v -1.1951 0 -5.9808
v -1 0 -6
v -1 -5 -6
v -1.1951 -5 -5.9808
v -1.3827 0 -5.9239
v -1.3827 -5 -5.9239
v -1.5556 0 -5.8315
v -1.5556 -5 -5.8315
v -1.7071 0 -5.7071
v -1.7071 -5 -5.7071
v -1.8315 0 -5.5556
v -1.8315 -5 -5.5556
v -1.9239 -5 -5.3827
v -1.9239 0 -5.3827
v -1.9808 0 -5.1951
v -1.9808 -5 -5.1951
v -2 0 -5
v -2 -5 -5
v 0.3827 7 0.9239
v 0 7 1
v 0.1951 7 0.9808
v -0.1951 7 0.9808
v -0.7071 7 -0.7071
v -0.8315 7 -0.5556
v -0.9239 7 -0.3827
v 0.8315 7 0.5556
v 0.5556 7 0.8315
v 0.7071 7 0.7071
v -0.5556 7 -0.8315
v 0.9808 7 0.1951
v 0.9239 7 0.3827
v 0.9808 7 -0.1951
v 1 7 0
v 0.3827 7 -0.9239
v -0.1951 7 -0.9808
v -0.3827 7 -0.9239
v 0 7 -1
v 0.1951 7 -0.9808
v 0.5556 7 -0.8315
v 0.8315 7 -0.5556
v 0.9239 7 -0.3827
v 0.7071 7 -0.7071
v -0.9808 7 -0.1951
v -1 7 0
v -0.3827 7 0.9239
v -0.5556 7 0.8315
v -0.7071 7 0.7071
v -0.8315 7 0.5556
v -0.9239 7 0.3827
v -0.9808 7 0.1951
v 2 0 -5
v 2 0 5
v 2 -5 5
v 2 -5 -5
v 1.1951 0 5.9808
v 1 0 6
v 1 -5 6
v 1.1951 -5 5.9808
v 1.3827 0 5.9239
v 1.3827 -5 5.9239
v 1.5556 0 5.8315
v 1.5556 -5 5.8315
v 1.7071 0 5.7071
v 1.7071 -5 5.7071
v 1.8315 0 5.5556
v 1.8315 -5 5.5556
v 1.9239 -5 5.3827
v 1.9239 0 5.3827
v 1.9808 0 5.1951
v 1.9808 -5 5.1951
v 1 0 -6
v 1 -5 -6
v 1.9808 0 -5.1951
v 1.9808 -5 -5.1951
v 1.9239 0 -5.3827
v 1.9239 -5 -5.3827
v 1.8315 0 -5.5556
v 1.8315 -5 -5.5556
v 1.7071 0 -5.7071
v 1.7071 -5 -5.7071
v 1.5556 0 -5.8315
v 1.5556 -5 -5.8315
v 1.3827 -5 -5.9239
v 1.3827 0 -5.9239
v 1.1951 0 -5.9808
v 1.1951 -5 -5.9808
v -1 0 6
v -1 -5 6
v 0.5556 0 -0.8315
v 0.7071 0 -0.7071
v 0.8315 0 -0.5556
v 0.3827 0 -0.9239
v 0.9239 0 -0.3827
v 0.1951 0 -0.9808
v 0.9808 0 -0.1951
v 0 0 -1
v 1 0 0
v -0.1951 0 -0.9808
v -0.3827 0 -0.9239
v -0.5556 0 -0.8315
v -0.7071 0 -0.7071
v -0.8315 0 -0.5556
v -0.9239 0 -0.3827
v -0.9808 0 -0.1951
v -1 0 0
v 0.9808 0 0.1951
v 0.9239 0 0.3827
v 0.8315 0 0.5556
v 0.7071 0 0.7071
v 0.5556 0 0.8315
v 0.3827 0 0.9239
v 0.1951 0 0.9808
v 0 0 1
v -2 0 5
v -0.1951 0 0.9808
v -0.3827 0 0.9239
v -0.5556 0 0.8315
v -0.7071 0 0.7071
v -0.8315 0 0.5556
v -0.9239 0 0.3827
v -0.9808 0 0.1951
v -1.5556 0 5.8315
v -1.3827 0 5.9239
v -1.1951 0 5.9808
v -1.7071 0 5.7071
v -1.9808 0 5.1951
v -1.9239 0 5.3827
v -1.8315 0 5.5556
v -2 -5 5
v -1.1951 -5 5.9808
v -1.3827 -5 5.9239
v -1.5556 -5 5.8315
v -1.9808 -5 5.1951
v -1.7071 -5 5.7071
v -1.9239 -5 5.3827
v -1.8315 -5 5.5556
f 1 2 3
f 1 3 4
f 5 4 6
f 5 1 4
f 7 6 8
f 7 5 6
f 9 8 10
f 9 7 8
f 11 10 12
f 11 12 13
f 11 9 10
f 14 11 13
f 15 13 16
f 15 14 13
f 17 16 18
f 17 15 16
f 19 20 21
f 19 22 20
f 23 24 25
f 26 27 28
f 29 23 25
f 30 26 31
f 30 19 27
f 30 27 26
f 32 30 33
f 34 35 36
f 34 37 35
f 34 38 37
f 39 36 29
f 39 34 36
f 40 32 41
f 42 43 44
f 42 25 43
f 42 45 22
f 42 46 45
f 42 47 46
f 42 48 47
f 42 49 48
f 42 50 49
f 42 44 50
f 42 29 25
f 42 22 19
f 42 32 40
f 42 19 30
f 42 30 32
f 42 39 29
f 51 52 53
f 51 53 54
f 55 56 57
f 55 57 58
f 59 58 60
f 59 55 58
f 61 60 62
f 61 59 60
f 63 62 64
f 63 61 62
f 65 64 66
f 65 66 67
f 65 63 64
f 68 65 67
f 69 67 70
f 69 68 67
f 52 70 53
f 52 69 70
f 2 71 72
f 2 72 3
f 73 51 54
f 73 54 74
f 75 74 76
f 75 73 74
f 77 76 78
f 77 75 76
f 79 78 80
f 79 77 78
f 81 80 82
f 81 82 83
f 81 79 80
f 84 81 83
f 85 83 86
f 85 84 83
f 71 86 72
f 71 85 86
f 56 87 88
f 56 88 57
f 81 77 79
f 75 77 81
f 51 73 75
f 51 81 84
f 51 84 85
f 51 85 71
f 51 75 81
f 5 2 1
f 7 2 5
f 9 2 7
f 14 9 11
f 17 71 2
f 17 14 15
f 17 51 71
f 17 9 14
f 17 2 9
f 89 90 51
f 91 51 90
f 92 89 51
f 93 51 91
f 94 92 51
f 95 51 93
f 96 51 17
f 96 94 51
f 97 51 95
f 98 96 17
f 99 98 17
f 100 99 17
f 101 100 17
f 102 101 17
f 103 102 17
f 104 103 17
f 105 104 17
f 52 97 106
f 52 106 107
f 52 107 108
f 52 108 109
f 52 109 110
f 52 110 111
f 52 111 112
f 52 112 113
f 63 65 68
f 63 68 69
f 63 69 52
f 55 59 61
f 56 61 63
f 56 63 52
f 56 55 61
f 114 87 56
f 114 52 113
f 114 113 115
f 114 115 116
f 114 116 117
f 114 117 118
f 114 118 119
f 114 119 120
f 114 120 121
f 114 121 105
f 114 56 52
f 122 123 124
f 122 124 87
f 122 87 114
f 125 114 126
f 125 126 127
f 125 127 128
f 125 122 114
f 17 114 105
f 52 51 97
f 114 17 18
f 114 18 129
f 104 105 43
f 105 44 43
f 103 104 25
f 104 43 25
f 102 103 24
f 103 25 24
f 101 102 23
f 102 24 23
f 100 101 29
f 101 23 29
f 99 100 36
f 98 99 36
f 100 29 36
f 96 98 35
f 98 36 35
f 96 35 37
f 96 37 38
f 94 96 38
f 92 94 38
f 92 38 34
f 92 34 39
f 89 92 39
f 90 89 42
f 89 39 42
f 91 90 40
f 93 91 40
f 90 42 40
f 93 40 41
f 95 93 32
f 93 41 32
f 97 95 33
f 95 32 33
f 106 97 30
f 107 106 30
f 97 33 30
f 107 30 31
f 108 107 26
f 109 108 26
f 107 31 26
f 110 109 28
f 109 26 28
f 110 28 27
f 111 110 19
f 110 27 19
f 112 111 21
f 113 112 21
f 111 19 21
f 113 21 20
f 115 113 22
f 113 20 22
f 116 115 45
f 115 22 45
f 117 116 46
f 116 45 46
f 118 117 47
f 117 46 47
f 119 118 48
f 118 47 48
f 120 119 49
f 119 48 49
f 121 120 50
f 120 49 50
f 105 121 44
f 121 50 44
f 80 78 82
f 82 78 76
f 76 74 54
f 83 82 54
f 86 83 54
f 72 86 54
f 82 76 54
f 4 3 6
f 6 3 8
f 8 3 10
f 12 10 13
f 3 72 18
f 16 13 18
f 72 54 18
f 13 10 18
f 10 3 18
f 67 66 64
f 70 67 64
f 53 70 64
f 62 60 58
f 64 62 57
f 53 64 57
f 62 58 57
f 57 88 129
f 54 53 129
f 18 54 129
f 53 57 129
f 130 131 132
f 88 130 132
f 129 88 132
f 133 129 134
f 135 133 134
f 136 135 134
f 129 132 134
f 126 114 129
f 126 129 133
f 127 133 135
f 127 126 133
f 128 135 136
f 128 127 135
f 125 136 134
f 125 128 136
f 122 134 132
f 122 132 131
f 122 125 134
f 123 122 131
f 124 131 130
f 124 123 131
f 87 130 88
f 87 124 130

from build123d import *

# Parameters (mm, degrees)
SKETCH1_W           = 1
SKETCH1_H           = 7
BOSS_EXTRUDE1_DEPTH = 5


with BuildPart() as part:
    # Sketch1 → Revolve1 (revolve)
    with BuildSketch(Plane.XY, mode=Mode.PRIVATE) as revolve1_sk:
        with Locations((0.5, 3.5)):
            Rectangle(SKETCH1_W, SKETCH1_H)
    revolve(revolve1_sk.sketch.rotate(Axis((0, 7, 0), (0, -1, 0)), 180), axis=Axis((0, 7, 0), (0, -1, 0)))

    # Sketch2 → Boss-Extrude1 (add)
    with BuildSketch(Plane.XZ):
        with BuildLine():
            Line((1, -6), (-1, -6))
            ThreePointArc((-1, -6), (-1.707106781, -5.707106781), (-2, -5))
            Line((-2, -5), (-2, 5))
            ThreePointArc((-2, 5), (-1.707106781, 5.707106781), (-1, 6))
            Line((-1, 6), (1, 6))
            ThreePointArc((1, 6), (1.707106781, 5.707106781), (2, 5))
            Line((2, 5), (2, -5))
            ThreePointArc((2, -5), (1.707106781, -5.707106781), (1, -6))
        make_face()
    extrude(amount=BOSS_EXTRUDE1_DEPTH)


solid = part.part
